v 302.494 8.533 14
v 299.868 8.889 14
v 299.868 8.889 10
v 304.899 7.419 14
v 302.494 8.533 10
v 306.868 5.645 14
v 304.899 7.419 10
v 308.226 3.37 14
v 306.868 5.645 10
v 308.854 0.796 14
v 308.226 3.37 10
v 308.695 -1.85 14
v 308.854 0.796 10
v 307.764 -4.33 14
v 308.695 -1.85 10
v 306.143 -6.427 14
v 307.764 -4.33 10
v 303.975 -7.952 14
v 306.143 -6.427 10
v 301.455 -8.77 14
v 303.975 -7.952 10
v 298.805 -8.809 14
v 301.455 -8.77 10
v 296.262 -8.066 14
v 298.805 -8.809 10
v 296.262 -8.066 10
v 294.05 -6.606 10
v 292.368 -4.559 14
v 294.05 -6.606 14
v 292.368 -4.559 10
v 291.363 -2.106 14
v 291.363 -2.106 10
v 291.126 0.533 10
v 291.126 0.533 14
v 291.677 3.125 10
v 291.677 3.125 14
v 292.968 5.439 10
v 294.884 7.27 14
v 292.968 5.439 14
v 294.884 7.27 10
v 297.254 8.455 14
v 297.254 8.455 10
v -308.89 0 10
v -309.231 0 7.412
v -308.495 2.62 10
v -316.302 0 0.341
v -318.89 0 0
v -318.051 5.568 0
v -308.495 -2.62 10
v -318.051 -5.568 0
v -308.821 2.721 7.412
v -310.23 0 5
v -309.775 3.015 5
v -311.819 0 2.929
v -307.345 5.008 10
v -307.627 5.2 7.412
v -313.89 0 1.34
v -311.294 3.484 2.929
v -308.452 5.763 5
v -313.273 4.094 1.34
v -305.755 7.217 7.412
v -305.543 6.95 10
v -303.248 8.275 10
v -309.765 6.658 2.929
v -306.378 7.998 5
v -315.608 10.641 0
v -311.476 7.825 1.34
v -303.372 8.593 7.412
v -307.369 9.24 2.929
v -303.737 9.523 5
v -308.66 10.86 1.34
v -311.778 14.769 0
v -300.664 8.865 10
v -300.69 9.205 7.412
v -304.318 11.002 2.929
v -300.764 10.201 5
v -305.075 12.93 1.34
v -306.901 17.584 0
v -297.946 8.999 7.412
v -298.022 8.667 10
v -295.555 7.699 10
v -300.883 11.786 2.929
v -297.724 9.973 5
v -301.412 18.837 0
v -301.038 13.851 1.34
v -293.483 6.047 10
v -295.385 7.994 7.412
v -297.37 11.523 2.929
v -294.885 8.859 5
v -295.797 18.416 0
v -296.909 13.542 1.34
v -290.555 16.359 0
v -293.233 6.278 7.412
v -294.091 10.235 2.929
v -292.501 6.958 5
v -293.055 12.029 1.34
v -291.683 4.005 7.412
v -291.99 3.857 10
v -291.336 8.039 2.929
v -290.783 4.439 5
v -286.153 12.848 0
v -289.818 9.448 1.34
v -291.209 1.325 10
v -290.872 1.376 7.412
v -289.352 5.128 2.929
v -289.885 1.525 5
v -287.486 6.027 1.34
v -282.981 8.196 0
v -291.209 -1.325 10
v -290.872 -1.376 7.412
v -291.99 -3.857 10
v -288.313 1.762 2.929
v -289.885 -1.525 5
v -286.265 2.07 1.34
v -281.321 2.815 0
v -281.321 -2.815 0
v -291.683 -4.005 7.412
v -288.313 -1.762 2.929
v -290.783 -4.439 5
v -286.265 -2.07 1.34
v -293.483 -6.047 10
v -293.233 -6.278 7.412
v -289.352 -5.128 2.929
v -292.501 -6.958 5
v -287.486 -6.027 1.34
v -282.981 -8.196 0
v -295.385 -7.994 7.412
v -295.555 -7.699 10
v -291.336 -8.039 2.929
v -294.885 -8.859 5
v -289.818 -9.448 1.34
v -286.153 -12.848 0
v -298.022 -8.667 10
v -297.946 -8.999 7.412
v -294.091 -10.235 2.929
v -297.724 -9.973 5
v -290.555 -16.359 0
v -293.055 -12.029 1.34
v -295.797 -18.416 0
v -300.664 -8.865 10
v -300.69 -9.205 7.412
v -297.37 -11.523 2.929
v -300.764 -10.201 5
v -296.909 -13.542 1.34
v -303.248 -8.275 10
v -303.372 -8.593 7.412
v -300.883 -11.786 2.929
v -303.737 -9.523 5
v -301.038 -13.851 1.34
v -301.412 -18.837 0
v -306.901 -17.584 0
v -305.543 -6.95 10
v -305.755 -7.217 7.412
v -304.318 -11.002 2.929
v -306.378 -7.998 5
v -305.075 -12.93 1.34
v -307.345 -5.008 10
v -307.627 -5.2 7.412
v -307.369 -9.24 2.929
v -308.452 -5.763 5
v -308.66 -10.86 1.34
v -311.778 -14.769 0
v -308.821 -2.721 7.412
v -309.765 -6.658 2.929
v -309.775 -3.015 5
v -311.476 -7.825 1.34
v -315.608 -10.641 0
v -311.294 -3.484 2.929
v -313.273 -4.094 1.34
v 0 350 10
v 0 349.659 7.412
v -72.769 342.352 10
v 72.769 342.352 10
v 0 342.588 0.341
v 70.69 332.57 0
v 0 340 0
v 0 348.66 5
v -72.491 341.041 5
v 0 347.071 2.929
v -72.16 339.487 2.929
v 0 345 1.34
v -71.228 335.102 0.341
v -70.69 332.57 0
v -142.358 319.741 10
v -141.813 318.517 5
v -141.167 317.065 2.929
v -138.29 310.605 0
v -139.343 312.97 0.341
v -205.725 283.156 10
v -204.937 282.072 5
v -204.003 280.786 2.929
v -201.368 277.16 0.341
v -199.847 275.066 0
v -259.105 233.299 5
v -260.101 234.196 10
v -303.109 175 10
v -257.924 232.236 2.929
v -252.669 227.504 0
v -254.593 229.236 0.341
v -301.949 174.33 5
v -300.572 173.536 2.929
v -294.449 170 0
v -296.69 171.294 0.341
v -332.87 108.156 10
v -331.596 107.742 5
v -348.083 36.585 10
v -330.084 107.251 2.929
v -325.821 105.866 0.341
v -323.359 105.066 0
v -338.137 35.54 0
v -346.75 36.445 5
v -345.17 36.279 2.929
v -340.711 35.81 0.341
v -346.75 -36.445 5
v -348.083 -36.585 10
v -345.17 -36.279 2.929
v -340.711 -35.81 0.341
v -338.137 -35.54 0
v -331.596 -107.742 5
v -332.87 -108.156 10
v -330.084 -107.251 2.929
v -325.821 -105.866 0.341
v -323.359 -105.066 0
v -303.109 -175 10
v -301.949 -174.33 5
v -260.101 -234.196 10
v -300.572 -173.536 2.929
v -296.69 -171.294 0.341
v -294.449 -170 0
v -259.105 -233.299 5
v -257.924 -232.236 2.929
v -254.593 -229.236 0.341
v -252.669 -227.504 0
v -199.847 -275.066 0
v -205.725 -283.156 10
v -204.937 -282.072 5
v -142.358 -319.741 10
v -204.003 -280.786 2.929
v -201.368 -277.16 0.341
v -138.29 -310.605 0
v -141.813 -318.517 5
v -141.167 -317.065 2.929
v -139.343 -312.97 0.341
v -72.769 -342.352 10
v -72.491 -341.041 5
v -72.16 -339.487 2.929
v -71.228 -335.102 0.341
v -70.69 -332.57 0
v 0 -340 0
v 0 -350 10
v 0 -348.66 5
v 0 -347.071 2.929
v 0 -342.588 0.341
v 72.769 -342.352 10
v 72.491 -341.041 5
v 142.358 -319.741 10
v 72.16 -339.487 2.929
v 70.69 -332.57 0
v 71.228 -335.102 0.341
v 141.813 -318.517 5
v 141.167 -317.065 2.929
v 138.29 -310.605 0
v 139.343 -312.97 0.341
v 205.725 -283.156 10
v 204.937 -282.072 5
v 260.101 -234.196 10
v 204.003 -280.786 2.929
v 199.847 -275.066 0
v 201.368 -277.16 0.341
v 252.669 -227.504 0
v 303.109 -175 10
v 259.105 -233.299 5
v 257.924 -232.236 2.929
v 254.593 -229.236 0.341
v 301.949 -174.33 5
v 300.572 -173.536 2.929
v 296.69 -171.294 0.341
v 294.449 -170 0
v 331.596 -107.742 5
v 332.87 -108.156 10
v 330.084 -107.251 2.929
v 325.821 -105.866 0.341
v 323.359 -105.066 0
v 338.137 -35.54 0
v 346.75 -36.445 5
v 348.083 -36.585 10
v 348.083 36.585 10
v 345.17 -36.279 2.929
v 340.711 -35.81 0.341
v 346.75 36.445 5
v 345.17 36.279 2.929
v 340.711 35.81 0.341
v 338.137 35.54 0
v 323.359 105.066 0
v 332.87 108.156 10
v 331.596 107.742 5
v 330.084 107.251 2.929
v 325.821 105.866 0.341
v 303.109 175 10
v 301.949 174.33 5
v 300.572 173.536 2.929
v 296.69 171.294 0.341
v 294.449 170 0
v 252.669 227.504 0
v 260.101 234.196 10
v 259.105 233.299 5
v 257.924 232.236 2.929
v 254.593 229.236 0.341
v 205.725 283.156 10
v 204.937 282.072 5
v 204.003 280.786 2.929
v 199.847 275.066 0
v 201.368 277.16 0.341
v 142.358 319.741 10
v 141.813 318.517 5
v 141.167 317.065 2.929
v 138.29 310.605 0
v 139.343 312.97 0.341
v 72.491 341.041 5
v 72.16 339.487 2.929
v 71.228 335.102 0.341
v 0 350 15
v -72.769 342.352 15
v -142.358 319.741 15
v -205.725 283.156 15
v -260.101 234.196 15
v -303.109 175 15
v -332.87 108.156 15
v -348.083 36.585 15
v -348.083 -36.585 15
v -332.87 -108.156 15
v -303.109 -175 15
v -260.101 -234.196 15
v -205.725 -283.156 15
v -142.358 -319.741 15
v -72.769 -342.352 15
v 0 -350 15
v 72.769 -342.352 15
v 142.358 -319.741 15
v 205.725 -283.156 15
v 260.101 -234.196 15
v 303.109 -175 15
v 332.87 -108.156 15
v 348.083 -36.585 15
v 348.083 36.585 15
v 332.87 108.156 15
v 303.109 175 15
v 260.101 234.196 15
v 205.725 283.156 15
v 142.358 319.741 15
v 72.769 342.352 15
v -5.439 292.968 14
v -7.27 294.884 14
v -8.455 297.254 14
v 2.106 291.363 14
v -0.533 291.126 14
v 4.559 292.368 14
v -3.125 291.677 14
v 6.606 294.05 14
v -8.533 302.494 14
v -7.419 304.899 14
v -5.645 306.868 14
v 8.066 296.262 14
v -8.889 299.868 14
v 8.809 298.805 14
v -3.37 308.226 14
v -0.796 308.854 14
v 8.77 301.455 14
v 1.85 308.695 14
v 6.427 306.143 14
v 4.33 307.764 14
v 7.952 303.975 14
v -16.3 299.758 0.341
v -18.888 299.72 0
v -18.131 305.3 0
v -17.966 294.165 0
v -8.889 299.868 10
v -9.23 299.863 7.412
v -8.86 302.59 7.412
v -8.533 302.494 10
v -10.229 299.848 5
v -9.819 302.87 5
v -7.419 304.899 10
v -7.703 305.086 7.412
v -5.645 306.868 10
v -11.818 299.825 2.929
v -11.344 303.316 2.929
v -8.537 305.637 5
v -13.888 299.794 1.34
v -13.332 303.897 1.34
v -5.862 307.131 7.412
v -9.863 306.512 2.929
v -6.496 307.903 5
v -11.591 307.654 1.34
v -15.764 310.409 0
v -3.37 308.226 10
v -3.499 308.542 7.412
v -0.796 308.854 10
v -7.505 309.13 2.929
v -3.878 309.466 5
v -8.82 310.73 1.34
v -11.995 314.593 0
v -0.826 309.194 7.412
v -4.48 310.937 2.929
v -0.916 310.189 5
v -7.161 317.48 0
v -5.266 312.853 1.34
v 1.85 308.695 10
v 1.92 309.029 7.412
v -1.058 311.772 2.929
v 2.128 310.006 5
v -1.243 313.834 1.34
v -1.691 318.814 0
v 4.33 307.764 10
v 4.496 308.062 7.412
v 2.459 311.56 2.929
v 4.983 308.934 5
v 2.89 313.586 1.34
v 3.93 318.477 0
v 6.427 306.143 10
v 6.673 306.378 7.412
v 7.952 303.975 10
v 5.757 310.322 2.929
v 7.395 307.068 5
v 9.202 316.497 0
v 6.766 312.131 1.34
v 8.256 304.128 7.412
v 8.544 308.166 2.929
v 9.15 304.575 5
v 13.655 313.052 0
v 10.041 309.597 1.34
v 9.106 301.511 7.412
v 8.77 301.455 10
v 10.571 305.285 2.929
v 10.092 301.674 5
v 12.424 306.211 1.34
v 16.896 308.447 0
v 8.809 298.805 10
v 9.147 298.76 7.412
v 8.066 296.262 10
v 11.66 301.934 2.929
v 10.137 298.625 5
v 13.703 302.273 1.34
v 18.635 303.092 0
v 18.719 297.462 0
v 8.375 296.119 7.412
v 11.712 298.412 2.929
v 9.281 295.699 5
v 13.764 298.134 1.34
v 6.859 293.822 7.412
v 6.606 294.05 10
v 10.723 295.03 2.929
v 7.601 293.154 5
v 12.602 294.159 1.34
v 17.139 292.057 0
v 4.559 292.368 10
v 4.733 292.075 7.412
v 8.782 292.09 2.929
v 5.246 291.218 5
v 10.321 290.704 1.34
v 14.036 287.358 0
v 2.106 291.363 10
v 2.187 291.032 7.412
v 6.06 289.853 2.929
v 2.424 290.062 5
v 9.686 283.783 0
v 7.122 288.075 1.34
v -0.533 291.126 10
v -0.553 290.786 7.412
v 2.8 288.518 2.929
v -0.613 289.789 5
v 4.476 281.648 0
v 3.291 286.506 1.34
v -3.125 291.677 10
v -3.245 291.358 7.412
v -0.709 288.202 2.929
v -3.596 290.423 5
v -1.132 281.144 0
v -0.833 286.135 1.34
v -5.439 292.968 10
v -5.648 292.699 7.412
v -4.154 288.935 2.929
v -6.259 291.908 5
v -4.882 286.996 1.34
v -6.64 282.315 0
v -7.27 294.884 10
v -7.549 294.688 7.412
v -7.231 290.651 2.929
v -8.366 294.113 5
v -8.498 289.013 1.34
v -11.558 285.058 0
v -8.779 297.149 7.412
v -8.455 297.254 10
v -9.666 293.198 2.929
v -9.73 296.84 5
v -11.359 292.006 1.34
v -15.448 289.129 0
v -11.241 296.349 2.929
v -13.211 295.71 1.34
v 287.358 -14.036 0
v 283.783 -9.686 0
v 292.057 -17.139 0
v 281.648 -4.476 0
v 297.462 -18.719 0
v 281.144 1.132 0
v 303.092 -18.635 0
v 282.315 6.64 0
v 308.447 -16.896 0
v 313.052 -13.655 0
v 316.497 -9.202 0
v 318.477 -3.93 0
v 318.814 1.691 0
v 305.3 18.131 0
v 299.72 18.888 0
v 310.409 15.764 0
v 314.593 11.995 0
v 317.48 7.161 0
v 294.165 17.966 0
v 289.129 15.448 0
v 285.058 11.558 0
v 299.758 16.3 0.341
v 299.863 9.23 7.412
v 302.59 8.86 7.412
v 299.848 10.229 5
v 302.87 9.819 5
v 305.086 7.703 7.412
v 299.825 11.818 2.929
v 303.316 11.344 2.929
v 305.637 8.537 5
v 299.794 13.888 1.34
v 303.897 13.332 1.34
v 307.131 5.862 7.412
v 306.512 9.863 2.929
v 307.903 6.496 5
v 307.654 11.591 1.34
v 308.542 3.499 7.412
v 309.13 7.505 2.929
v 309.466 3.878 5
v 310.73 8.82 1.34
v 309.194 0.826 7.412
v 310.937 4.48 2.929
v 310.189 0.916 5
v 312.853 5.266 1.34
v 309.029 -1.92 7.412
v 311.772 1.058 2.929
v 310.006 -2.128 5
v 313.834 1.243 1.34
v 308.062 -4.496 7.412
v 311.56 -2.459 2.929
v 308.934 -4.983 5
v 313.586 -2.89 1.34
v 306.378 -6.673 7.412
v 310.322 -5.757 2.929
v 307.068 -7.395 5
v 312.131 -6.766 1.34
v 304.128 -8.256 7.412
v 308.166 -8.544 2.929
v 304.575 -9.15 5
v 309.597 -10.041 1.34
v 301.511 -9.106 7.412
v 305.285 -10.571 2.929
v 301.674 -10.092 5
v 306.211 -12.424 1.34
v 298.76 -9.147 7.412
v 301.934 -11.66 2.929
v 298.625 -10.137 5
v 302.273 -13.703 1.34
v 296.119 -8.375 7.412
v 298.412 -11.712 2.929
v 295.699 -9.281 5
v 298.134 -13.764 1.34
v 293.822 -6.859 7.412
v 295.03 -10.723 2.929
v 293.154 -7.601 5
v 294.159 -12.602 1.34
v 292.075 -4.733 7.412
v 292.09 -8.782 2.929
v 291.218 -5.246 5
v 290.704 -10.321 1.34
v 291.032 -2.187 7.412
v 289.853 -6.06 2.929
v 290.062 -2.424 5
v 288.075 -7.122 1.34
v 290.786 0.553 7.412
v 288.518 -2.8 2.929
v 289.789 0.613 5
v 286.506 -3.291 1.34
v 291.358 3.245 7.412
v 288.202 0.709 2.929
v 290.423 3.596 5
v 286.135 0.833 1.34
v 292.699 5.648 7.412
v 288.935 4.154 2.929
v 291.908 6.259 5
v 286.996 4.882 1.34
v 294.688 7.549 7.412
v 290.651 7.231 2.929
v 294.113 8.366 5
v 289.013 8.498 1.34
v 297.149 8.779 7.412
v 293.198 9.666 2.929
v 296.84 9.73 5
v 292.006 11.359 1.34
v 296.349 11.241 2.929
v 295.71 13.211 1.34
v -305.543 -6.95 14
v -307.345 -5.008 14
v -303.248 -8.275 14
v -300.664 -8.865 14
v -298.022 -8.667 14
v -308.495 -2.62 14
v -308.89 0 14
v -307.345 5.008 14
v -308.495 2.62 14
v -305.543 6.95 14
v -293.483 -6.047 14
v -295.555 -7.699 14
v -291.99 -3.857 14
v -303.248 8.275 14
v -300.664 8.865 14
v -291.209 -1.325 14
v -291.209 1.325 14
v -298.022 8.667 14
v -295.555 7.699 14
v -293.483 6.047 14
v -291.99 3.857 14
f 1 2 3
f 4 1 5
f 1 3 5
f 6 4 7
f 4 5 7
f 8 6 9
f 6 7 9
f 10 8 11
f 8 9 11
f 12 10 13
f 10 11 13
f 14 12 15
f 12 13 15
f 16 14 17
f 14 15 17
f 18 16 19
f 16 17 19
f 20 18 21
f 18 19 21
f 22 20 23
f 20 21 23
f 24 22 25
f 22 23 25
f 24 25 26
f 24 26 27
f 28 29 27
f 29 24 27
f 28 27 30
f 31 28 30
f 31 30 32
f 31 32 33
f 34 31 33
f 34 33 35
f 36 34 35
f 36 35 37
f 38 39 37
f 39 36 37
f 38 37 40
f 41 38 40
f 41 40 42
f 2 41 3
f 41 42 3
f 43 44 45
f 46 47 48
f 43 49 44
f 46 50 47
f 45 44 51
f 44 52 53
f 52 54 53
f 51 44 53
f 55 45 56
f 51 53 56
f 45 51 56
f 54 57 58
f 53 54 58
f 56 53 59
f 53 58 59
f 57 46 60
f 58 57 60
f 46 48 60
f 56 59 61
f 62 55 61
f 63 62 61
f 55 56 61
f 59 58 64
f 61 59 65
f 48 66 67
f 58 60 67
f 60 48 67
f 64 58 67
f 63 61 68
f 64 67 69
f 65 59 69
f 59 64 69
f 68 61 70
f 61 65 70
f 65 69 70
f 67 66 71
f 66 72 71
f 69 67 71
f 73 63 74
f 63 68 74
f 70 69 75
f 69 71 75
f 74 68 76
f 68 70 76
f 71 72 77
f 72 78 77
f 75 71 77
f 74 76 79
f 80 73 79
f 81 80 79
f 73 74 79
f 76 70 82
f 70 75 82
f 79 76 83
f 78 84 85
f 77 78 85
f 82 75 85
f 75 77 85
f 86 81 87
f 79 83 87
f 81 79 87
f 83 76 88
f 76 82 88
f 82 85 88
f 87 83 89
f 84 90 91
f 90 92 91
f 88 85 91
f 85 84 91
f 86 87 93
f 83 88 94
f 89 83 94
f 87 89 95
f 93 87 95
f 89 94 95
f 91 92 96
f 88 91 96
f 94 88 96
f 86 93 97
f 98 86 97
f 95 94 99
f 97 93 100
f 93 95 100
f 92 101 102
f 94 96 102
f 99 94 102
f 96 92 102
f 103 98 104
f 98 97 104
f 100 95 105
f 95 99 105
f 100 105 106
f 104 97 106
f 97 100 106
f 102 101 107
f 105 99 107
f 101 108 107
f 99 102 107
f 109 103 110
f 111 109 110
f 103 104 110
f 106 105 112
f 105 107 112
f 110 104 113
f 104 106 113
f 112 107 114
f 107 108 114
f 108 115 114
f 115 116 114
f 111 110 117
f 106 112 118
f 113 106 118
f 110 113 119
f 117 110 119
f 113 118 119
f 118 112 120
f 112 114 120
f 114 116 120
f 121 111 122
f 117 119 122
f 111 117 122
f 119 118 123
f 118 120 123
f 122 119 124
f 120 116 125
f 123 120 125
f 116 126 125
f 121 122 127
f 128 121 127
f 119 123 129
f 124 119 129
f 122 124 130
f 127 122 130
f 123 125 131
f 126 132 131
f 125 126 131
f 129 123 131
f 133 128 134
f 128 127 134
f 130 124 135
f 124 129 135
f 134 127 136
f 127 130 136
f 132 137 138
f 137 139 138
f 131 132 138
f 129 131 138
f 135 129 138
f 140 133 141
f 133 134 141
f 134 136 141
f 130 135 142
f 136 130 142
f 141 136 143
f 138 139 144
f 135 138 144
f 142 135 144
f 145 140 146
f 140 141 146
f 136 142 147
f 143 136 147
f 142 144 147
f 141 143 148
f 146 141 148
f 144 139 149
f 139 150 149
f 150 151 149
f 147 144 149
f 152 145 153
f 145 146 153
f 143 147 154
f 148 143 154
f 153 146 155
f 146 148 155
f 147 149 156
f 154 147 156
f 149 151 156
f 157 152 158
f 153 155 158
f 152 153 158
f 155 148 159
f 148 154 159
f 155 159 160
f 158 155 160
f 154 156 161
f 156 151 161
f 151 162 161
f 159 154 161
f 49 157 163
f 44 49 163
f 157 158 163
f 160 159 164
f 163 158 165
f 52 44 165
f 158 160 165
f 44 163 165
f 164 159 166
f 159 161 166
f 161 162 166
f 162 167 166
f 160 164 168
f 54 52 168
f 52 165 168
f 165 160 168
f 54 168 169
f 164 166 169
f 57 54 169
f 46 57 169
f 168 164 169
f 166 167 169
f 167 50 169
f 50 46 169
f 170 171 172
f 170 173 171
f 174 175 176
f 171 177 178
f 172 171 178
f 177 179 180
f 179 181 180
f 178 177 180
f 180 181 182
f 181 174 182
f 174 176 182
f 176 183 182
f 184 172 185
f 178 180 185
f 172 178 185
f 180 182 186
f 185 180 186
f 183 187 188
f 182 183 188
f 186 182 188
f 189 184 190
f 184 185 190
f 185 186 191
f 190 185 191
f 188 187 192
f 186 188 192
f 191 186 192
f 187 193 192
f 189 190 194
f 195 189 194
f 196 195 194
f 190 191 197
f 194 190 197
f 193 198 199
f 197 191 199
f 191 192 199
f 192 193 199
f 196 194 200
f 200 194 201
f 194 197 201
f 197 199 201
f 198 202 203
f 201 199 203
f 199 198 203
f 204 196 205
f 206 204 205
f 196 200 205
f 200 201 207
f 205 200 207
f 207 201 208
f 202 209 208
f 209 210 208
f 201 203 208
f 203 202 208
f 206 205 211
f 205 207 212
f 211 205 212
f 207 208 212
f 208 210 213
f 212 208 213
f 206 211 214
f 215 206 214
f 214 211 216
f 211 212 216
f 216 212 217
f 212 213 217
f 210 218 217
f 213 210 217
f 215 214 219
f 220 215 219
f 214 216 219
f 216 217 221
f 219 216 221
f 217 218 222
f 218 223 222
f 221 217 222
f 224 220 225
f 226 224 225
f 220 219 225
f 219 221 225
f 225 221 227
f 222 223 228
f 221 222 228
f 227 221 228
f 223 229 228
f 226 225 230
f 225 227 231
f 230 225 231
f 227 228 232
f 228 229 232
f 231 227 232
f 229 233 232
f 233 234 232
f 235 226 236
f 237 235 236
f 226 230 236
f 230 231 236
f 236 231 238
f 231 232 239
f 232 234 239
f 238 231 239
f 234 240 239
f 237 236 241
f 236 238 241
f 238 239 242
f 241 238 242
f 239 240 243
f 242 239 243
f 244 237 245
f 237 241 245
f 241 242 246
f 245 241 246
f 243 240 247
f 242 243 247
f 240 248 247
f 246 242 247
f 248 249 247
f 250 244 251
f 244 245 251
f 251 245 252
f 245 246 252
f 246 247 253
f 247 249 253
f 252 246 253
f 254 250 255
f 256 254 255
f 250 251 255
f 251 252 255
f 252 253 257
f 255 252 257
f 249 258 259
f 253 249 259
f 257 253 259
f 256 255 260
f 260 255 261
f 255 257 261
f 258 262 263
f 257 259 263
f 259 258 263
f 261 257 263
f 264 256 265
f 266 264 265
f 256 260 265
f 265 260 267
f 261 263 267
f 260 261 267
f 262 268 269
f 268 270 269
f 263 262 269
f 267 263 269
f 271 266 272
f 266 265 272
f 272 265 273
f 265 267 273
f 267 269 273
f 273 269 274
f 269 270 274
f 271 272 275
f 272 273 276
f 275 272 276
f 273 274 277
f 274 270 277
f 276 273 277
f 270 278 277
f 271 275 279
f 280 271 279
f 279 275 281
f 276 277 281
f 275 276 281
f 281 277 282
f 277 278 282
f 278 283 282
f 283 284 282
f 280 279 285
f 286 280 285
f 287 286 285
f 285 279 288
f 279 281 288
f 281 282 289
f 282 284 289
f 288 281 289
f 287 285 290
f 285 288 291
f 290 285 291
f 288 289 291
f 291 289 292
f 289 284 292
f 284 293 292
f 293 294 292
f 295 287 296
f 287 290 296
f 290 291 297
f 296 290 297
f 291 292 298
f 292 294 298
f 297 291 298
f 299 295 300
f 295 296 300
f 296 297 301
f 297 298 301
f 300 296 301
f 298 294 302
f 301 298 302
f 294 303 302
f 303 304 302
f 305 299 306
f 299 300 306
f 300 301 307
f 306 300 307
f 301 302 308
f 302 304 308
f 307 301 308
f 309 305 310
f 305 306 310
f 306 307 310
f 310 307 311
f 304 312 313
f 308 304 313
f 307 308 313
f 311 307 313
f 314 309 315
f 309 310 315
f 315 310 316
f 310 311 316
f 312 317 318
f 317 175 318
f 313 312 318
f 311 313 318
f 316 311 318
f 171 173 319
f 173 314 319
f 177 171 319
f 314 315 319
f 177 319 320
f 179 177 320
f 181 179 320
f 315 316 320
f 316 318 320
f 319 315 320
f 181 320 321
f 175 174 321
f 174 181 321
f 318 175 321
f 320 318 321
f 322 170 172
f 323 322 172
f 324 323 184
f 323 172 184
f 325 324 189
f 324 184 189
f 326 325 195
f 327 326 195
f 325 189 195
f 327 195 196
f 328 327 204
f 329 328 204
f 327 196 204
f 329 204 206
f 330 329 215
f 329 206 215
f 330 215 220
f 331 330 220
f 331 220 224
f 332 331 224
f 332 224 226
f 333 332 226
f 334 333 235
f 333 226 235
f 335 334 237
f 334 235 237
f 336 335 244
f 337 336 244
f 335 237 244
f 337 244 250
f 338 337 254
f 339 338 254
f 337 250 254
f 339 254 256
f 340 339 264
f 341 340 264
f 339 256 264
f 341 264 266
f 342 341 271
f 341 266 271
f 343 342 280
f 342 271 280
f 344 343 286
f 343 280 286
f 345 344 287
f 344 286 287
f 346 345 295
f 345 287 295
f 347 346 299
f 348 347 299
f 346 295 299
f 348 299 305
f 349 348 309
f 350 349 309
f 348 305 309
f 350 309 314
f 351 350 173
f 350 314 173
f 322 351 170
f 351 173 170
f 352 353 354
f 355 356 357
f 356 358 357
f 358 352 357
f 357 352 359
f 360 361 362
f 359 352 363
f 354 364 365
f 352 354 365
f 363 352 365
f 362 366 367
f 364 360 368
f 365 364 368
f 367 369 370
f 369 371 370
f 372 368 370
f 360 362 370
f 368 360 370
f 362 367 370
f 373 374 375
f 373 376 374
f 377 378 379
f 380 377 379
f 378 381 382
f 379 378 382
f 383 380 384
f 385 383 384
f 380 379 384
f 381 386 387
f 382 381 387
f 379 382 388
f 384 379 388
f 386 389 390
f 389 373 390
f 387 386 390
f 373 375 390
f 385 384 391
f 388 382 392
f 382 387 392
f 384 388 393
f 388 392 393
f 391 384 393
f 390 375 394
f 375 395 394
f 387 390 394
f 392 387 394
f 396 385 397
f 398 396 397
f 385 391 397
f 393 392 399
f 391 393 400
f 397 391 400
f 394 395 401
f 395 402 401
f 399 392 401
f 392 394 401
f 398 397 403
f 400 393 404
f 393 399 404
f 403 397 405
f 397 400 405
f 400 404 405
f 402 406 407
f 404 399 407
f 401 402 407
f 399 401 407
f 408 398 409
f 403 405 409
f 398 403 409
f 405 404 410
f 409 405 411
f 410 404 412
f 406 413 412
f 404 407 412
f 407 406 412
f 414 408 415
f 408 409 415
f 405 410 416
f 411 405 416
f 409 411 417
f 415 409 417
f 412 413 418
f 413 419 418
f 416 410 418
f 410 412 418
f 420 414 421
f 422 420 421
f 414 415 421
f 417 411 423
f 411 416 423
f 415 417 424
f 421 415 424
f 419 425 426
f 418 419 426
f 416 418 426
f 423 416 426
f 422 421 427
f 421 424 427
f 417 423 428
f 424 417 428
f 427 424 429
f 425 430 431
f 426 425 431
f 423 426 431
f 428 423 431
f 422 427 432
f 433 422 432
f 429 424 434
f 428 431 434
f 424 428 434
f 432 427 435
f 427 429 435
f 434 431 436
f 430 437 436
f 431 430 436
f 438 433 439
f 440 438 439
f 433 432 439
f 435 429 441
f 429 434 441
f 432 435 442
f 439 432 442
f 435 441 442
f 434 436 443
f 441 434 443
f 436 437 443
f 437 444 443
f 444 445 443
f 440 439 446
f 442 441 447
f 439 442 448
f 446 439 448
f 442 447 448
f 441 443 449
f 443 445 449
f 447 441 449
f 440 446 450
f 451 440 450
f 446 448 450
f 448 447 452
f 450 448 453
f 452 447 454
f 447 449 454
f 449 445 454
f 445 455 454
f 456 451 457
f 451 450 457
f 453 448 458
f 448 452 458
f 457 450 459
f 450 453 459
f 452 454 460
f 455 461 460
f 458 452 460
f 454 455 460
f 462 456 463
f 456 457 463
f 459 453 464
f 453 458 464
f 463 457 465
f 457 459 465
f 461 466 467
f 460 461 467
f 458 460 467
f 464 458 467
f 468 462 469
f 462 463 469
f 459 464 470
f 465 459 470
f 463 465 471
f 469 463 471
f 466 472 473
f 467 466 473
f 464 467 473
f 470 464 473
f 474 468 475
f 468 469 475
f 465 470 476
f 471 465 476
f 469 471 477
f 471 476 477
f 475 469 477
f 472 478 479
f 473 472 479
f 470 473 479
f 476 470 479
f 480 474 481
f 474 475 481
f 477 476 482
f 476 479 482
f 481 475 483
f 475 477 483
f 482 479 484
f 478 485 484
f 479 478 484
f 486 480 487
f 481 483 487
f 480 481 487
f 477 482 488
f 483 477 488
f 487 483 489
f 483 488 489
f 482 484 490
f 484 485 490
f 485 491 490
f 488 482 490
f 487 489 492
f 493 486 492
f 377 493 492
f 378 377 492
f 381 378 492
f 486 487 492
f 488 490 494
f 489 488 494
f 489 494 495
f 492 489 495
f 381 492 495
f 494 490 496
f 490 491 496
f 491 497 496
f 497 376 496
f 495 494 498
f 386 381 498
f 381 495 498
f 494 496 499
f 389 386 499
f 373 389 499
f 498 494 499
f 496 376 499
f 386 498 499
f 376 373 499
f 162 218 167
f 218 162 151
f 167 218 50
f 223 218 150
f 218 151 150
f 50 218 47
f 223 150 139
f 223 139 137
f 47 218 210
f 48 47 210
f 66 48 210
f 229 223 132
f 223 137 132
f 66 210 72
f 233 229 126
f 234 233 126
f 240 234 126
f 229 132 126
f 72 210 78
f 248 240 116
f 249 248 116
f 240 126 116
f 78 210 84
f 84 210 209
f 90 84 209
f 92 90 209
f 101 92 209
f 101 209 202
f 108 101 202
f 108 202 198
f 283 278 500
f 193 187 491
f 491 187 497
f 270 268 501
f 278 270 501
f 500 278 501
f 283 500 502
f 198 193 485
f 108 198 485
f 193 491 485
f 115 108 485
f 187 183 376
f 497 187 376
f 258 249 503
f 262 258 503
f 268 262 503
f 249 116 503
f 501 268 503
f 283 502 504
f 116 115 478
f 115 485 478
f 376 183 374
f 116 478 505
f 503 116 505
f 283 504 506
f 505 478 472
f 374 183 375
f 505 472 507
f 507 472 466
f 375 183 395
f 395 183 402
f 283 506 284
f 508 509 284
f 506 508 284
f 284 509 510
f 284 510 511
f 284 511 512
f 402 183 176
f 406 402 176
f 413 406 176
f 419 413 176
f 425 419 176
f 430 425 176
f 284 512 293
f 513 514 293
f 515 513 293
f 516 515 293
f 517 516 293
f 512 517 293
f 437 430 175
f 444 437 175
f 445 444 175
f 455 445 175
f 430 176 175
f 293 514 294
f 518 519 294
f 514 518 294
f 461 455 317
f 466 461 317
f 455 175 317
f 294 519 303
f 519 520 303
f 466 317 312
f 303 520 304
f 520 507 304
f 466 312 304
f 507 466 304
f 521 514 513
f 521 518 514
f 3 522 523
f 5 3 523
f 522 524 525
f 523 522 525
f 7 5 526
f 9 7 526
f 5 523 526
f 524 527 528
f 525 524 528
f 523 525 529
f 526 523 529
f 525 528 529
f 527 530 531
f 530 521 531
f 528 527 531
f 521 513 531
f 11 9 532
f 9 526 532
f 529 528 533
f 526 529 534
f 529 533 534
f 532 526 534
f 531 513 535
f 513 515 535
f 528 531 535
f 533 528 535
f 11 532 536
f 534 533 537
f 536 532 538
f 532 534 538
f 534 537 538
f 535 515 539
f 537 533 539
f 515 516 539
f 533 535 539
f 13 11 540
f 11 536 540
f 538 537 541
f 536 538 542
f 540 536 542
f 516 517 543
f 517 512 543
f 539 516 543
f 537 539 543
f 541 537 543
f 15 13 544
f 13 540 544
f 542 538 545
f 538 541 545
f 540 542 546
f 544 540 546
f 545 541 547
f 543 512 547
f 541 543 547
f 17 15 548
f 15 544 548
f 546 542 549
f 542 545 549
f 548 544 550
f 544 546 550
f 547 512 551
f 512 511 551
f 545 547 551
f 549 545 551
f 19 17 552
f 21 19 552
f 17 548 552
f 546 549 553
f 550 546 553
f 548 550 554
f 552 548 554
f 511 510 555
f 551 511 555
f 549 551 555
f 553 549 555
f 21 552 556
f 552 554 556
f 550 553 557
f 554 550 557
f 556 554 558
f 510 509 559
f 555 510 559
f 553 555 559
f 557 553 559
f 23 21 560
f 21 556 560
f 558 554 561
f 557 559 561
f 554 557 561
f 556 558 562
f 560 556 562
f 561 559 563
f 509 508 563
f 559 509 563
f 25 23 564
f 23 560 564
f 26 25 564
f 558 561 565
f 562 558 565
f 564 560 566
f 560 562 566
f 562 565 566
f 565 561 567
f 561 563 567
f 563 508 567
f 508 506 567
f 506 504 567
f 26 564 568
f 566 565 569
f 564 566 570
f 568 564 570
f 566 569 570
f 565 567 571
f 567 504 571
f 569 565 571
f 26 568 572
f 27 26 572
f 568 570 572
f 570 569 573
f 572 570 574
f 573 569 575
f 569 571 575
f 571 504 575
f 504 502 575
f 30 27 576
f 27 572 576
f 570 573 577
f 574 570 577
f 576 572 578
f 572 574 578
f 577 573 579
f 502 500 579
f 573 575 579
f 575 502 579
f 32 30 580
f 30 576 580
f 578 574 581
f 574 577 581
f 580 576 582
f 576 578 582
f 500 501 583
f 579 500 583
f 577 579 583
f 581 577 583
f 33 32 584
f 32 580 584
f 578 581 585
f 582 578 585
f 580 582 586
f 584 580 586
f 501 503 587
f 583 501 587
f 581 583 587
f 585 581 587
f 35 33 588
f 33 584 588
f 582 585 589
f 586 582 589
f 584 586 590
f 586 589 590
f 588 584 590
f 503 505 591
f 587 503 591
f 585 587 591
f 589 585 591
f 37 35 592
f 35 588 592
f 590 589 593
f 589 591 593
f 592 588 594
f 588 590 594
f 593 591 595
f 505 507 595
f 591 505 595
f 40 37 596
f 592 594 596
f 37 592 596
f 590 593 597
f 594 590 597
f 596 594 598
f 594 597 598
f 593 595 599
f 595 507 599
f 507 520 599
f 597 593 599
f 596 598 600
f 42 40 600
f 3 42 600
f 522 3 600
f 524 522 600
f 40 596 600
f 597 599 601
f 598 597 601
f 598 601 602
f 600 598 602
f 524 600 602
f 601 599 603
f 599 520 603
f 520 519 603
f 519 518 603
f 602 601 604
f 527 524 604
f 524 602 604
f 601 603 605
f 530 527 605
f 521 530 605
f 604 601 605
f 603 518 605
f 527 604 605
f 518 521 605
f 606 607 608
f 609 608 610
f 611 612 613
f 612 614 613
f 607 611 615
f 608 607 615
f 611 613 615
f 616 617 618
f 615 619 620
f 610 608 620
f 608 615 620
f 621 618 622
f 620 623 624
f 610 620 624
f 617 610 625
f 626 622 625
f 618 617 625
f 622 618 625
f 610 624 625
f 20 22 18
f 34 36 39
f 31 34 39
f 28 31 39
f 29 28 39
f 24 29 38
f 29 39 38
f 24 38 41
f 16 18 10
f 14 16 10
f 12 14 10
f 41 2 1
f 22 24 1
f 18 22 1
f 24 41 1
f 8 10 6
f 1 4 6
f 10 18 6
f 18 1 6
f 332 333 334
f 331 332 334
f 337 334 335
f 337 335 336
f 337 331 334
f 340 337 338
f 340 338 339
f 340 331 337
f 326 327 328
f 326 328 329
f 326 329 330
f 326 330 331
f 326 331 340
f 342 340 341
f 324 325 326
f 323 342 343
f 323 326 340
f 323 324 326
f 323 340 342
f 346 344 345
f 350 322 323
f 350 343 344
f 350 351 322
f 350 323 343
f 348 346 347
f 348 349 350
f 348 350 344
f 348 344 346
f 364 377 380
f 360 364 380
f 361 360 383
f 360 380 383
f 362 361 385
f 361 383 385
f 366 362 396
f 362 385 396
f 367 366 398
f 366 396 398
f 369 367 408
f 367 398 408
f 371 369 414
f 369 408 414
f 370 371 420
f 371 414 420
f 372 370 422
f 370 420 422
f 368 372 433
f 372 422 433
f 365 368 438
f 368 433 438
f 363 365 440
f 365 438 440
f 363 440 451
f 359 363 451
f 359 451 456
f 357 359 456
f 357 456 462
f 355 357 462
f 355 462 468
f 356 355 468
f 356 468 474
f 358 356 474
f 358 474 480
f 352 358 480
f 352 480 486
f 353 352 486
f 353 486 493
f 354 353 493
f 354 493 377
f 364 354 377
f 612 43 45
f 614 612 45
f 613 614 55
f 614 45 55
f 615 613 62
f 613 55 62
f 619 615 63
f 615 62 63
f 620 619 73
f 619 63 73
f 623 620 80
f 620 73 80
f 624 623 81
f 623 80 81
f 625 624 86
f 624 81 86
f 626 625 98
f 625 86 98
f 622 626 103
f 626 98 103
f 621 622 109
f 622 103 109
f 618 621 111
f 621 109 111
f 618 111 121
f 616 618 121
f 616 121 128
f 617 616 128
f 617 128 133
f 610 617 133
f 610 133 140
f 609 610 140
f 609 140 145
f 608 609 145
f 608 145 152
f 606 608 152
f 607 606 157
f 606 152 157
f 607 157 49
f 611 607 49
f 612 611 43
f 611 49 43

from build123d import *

# Parameters (mm, degrees)
BOSS_EXTRUDE1_DEPTH = 15
FILLET1_R           = 10
BOSS_EXTRUDE2_START = -0.9999999999999974
SKETCH4_R           = 8.890000000000002
SKETCH4_R_2         = 8.890000000000008
SKETCH4_R_3         = 8.890000000000004
BOSS_EXTRUDE2_DEPTH = 0.9999999999999974


with BuildPart() as part:
    # Sketch2 → Boss-Extrude1 (new body)
    with BuildSketch(Plane.XY):
        with BuildLine():
            Line((0, 0), (-291.11000000000007, 0))
            ThreePointArc((-291.11000000000007, -2.18e-15), (-293.667421840922, -6.23943537983746), (-299.86827983333353, -8.889024119536039))
            ThreePointArc((-299.8682798333336, -8.88902411952966), (-5.91709e-12, -300.00000000000006), (299.86827983333325, -8.889024119541757))
            ThreePointArc((299.86827983333325, -8.889024119536035), (293.66742184092186, -6.23943537983736), (291.11000000000007, 1.09e-15))
            Line((291.1100000000001, 0), (0, 0))
        make_face()
        with BuildLine():
            ThreePointArc((-299.86827983333353, 8.889024119536039), (-293.667421840922, 6.23943537983746), (-291.11000000000007, 0))
            Line((-291.11000000000007, 0), (0, 0))
            Line((0, 0), (0, 291.11000000000007))
            ThreePointArc((1.0101e-13, 291.11000000000007), (-6.239435379837412, 293.6674218409219), (-8.889024119536034, 299.86827983333353))
            ThreePointArc((-8.889024119531676, 299.86827983333353), (-212.13203435596503, 212.13203435596358), (-299.8682798333336, 8.8890241195296))
        make_face()
        with BuildLine():
            Line((0, 291.11000000000007), (0, 0))
            Line((0, 0), (291.1100000000001, 0))
            ThreePointArc((291.11000000000007, 1.09e-15), (293.66742184092186, 6.239435379837364), (299.86827983333325, 8.889024119536035))
            ThreePointArc((299.86827983333325, 8.889024119541785), (212.1320343559607, 212.13203435596787), (8.889024119531646, 299.86827983333353))
            ThreePointArc((8.889024119536034, 299.86827983333353), (6.239435379837482, 293.66742184092203), (1.0101e-13, 291.11000000000007))
        make_face()
        with BuildLine():
            ThreePointArc((299.86827983333325, -8.889024119541757), (-5.91709e-12, -300.00000000000006), (-299.8682798333336, -8.88902411952966))
            ThreePointArc((-299.86827983333353, -8.889024119536039), (-306.2394353798375, -6.332578159078076), (-308.89000000000004, 1.09e-15))
            Line((-308.89000000000004, 0), (-350, 0))
            ThreePointArc((-350, 4.286e-14), (-6.429e-14, -350), (350, -8.573e-14))
            Line((350, 0), (308.8900000000001, 0))
            ThreePointArc((308.89000000000004, -2.18e-15), (306.2394353798374, -6.332578159078179), (299.86827983333325, -8.889024119536035))
        make_face()
        with BuildLine():
            ThreePointArc((8.889024119531646, 299.86827983333353), (212.1320343559607, 212.13203435596787), (299.86827983333325, 8.889024119541785))
            ThreePointArc((299.86827983333325, 8.889024119536035), (306.2394353798374, 6.332578159078173), (308.89000000000004, 0))
            Line((308.8900000000001, 0), (350, 0))
            ThreePointArc((350, 0), (247.48737341529164, 247.48737341529161), (9.915e-14, 350))
            Line((0, 350), (0, 308.89000000000004))
            ThreePointArc((9.924e-14, 308.89000000000004), (6.286179284748443, 306.2861792847484), (8.89, 300.00000000000006))
            ThreePointArc((8.89, 300.00000000000006), (8.889756026536256, 299.9341381091804), (8.889024119536034, 299.86827983333353))
        make_face()
        with BuildLine():
            ThreePointArc((-308.89000000000004, 1.09e-15), (-306.2394353798375, 6.332578159078078), (-299.86827983333353, 8.889024119536039))
            ThreePointArc((-299.8682798333336, 8.8890241195296), (-212.13203435596503, 212.13203435596358), (-8.889024119531676, 299.86827983333353))
            ThreePointArc((-8.889024119536034, 299.86827983333353), (-6.332578159078046, 306.2394353798375), (9.924e-14, 308.89000000000004))
            Line((0, 308.89000000000004), (0, 350))
            ThreePointArc((2.143e-14, 350), (-247.48737341529161, 247.48737341529164), (-350, 4.286e-14))
            Line((-350, 0), (-308.89000000000004, 0))
        make_face()
    extrude(amount=BOSS_EXTRUDE1_DEPTH)

    # Fillet1
    fillet1_edges = [part.edges().sort_by_distance(p)[0] for p in [
        (291.11000000000007, -3.375e-14, 0),
        (8.889024119535959, 300.13172016666664, 0),
        (-300.1317201666668, -8.889024119535831, 0),
        (-350, -1.4099e-13, 0),
    ]]
    fillet(fillet1_edges, radius=FILLET1_R)

    # Sketch4 → Boss-Extrude2 (add)
    with BuildSketch(Plane.XY.offset(15).offset(BOSS_EXTRUDE2_START)):
        with Locations((0, 300.00000000000006)):
            Circle(SKETCH4_R)
        with Locations((300.00000000000006, 0)):
            Circle(SKETCH4_R_2)
        with Locations((-300.00000000000006, 0)):
            Circle(SKETCH4_R_3)
    extrude(amount=BOSS_EXTRUDE2_DEPTH)


solid = part.part
